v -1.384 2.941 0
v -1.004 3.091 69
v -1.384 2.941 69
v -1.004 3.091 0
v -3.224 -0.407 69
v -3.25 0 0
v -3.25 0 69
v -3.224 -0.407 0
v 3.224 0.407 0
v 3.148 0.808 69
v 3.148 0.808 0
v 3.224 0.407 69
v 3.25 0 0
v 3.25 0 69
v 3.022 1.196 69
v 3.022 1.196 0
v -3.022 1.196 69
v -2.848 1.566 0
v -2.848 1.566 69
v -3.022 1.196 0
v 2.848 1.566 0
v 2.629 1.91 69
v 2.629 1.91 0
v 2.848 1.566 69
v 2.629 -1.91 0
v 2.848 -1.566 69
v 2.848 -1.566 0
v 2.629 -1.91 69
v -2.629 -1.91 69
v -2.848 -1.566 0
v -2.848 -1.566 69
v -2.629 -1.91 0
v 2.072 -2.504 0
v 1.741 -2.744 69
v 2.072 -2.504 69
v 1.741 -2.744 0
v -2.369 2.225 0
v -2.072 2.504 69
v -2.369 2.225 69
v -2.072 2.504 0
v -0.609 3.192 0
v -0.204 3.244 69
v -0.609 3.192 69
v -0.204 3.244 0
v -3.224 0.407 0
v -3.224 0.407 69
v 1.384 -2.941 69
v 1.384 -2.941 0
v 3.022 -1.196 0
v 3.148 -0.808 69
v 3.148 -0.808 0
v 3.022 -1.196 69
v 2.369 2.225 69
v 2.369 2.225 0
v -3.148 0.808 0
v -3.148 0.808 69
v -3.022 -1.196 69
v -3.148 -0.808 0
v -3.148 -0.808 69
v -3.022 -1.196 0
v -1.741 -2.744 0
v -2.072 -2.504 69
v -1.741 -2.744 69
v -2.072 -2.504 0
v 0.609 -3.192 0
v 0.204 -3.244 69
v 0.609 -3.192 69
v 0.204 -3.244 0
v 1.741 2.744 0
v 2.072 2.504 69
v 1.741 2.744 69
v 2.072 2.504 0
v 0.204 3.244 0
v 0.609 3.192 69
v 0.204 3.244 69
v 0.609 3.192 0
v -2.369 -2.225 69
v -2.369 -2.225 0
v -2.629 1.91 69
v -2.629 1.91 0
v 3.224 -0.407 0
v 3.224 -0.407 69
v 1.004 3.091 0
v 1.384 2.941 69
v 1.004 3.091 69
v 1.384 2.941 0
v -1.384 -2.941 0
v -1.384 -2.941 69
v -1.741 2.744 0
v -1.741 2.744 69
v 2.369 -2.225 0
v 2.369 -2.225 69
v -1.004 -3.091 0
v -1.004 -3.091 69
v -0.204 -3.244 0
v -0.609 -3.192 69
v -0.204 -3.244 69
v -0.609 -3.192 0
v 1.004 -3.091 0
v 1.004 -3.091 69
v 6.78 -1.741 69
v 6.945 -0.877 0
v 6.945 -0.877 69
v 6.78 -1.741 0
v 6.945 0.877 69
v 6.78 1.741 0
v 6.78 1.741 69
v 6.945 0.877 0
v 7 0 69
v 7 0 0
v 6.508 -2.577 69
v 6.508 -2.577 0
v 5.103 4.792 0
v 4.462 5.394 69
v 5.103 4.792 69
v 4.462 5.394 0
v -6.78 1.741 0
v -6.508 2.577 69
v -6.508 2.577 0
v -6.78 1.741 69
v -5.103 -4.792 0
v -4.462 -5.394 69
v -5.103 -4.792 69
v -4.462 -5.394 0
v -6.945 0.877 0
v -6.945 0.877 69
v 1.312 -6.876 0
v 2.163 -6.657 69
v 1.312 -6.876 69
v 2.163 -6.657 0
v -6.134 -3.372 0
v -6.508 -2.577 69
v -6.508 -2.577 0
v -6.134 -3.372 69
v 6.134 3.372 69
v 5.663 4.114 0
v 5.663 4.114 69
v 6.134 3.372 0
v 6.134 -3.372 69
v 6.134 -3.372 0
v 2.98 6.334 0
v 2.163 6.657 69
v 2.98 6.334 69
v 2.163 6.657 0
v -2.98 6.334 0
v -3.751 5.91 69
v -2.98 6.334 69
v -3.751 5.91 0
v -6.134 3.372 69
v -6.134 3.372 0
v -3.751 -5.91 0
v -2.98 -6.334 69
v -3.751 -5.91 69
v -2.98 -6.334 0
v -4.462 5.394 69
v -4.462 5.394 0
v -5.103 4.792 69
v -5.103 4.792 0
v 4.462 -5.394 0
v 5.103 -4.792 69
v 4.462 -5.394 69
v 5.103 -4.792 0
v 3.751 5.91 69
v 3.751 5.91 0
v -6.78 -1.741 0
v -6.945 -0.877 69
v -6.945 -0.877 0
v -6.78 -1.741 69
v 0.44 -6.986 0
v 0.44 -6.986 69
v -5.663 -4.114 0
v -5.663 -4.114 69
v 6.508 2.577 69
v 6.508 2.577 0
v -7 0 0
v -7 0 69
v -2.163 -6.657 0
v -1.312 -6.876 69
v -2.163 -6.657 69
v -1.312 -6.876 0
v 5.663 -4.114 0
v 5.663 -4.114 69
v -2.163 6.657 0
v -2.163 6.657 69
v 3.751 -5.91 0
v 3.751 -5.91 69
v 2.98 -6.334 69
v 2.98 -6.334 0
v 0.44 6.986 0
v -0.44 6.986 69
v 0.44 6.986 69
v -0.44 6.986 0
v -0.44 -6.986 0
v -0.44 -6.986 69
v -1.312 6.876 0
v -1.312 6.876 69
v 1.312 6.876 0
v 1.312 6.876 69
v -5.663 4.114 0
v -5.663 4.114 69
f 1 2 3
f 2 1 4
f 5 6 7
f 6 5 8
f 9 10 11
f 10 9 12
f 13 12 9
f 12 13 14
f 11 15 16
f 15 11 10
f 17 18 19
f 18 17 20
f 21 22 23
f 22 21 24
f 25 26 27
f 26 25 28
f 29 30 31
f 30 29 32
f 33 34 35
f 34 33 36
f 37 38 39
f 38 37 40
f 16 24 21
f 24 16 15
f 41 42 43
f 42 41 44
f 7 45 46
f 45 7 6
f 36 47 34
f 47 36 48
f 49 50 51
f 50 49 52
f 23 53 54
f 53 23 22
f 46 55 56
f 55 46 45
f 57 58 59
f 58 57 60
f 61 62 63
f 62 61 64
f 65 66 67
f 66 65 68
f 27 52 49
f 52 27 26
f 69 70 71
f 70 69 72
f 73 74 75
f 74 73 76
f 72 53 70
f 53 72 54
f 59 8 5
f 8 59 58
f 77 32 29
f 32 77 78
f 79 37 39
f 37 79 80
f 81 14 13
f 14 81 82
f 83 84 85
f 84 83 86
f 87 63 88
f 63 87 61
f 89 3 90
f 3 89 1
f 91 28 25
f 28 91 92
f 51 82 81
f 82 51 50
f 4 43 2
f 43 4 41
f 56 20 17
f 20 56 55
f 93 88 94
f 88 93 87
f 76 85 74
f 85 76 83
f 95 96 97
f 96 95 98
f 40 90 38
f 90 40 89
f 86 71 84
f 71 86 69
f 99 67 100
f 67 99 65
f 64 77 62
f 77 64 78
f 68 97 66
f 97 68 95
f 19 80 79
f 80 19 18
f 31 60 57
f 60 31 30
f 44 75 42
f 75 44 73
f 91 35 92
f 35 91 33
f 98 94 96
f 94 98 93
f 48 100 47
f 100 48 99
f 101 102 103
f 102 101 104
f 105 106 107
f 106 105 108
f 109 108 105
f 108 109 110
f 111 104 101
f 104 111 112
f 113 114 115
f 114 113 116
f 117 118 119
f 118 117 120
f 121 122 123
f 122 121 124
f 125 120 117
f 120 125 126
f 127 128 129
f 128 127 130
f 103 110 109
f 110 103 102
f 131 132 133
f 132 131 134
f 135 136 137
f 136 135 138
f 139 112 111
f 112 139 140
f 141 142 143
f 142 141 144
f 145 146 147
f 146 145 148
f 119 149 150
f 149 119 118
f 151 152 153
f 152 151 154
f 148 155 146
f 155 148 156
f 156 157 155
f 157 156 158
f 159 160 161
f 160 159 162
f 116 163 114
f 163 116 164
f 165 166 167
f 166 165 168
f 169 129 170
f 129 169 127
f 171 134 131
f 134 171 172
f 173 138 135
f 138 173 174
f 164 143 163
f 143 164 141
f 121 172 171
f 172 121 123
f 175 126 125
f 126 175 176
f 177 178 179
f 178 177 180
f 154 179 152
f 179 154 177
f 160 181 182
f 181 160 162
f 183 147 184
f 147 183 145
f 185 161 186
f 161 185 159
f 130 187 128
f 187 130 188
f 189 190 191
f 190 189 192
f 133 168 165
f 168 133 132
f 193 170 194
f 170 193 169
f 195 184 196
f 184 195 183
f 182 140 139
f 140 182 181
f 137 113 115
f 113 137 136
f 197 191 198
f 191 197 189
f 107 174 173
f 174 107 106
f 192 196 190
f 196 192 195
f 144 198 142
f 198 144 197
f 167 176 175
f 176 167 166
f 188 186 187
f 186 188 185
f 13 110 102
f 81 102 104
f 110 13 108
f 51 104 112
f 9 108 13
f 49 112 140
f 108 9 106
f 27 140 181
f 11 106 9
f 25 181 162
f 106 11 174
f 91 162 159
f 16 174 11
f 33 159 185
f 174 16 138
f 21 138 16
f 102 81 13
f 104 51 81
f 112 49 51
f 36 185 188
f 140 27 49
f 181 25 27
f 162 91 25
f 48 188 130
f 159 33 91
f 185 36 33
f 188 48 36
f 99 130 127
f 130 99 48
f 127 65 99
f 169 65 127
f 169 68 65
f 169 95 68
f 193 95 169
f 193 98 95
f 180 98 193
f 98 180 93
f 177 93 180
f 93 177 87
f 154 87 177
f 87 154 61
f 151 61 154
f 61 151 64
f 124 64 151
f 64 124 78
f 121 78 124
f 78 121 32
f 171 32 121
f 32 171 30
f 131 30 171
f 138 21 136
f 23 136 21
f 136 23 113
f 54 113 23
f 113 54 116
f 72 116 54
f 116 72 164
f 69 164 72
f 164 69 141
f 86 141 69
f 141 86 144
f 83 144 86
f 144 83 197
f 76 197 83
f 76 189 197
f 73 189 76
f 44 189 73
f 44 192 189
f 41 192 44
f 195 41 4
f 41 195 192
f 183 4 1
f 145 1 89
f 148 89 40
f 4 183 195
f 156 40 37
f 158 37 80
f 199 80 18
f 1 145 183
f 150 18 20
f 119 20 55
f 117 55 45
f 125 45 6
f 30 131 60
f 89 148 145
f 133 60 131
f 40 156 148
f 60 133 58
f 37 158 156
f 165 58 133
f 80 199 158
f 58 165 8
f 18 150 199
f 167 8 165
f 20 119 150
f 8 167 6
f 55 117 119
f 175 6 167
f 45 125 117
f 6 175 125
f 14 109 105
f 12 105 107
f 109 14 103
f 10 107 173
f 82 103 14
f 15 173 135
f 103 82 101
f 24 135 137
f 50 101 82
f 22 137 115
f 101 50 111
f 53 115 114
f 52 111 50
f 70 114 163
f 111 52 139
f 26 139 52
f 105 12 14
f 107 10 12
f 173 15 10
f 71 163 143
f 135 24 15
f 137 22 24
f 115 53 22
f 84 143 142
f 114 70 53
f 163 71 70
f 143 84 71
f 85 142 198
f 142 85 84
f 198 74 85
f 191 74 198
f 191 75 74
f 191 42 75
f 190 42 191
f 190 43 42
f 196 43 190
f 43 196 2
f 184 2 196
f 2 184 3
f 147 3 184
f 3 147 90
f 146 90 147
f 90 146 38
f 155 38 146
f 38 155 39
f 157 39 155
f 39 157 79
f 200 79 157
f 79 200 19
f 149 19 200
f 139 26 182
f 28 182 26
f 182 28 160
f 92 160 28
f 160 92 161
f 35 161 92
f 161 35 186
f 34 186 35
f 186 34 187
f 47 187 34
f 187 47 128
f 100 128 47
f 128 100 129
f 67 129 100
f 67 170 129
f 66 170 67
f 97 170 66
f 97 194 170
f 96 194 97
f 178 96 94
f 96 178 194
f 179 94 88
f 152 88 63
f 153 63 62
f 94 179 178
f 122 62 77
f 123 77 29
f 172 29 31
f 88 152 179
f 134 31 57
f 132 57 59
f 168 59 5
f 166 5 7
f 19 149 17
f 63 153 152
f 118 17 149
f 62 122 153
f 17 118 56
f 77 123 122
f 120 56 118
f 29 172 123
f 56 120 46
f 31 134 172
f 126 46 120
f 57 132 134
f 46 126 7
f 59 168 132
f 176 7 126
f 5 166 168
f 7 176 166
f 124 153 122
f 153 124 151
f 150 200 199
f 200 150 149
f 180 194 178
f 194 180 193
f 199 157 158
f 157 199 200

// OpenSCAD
$fn = 50;


difference() {
	union() {
		cylinder(h = 69, r = 7.0000000000);
	}
	union() {
		translate(v = [0.0000000000, 0.0000000000, -100.0000000000]) {
			cylinder(h = 200, r = 3.2500000000);
		}
		translate(v = [0.0000000000, 0.0000000000, -100.0000000000]) {
			cylinder(h = 200, r = 3.2500000000);
		}
		translate(v = [0.0000000000, 0.0000000000, -100.0000000000]) {
			cylinder(h = 200, r = 3.2500000000);
		}
		translate(v = [0.0000000000, 0.0000000000, -100.0000000000]) {
			cylinder(h = 200, r = 3.2500000000);
		}
	}
}
